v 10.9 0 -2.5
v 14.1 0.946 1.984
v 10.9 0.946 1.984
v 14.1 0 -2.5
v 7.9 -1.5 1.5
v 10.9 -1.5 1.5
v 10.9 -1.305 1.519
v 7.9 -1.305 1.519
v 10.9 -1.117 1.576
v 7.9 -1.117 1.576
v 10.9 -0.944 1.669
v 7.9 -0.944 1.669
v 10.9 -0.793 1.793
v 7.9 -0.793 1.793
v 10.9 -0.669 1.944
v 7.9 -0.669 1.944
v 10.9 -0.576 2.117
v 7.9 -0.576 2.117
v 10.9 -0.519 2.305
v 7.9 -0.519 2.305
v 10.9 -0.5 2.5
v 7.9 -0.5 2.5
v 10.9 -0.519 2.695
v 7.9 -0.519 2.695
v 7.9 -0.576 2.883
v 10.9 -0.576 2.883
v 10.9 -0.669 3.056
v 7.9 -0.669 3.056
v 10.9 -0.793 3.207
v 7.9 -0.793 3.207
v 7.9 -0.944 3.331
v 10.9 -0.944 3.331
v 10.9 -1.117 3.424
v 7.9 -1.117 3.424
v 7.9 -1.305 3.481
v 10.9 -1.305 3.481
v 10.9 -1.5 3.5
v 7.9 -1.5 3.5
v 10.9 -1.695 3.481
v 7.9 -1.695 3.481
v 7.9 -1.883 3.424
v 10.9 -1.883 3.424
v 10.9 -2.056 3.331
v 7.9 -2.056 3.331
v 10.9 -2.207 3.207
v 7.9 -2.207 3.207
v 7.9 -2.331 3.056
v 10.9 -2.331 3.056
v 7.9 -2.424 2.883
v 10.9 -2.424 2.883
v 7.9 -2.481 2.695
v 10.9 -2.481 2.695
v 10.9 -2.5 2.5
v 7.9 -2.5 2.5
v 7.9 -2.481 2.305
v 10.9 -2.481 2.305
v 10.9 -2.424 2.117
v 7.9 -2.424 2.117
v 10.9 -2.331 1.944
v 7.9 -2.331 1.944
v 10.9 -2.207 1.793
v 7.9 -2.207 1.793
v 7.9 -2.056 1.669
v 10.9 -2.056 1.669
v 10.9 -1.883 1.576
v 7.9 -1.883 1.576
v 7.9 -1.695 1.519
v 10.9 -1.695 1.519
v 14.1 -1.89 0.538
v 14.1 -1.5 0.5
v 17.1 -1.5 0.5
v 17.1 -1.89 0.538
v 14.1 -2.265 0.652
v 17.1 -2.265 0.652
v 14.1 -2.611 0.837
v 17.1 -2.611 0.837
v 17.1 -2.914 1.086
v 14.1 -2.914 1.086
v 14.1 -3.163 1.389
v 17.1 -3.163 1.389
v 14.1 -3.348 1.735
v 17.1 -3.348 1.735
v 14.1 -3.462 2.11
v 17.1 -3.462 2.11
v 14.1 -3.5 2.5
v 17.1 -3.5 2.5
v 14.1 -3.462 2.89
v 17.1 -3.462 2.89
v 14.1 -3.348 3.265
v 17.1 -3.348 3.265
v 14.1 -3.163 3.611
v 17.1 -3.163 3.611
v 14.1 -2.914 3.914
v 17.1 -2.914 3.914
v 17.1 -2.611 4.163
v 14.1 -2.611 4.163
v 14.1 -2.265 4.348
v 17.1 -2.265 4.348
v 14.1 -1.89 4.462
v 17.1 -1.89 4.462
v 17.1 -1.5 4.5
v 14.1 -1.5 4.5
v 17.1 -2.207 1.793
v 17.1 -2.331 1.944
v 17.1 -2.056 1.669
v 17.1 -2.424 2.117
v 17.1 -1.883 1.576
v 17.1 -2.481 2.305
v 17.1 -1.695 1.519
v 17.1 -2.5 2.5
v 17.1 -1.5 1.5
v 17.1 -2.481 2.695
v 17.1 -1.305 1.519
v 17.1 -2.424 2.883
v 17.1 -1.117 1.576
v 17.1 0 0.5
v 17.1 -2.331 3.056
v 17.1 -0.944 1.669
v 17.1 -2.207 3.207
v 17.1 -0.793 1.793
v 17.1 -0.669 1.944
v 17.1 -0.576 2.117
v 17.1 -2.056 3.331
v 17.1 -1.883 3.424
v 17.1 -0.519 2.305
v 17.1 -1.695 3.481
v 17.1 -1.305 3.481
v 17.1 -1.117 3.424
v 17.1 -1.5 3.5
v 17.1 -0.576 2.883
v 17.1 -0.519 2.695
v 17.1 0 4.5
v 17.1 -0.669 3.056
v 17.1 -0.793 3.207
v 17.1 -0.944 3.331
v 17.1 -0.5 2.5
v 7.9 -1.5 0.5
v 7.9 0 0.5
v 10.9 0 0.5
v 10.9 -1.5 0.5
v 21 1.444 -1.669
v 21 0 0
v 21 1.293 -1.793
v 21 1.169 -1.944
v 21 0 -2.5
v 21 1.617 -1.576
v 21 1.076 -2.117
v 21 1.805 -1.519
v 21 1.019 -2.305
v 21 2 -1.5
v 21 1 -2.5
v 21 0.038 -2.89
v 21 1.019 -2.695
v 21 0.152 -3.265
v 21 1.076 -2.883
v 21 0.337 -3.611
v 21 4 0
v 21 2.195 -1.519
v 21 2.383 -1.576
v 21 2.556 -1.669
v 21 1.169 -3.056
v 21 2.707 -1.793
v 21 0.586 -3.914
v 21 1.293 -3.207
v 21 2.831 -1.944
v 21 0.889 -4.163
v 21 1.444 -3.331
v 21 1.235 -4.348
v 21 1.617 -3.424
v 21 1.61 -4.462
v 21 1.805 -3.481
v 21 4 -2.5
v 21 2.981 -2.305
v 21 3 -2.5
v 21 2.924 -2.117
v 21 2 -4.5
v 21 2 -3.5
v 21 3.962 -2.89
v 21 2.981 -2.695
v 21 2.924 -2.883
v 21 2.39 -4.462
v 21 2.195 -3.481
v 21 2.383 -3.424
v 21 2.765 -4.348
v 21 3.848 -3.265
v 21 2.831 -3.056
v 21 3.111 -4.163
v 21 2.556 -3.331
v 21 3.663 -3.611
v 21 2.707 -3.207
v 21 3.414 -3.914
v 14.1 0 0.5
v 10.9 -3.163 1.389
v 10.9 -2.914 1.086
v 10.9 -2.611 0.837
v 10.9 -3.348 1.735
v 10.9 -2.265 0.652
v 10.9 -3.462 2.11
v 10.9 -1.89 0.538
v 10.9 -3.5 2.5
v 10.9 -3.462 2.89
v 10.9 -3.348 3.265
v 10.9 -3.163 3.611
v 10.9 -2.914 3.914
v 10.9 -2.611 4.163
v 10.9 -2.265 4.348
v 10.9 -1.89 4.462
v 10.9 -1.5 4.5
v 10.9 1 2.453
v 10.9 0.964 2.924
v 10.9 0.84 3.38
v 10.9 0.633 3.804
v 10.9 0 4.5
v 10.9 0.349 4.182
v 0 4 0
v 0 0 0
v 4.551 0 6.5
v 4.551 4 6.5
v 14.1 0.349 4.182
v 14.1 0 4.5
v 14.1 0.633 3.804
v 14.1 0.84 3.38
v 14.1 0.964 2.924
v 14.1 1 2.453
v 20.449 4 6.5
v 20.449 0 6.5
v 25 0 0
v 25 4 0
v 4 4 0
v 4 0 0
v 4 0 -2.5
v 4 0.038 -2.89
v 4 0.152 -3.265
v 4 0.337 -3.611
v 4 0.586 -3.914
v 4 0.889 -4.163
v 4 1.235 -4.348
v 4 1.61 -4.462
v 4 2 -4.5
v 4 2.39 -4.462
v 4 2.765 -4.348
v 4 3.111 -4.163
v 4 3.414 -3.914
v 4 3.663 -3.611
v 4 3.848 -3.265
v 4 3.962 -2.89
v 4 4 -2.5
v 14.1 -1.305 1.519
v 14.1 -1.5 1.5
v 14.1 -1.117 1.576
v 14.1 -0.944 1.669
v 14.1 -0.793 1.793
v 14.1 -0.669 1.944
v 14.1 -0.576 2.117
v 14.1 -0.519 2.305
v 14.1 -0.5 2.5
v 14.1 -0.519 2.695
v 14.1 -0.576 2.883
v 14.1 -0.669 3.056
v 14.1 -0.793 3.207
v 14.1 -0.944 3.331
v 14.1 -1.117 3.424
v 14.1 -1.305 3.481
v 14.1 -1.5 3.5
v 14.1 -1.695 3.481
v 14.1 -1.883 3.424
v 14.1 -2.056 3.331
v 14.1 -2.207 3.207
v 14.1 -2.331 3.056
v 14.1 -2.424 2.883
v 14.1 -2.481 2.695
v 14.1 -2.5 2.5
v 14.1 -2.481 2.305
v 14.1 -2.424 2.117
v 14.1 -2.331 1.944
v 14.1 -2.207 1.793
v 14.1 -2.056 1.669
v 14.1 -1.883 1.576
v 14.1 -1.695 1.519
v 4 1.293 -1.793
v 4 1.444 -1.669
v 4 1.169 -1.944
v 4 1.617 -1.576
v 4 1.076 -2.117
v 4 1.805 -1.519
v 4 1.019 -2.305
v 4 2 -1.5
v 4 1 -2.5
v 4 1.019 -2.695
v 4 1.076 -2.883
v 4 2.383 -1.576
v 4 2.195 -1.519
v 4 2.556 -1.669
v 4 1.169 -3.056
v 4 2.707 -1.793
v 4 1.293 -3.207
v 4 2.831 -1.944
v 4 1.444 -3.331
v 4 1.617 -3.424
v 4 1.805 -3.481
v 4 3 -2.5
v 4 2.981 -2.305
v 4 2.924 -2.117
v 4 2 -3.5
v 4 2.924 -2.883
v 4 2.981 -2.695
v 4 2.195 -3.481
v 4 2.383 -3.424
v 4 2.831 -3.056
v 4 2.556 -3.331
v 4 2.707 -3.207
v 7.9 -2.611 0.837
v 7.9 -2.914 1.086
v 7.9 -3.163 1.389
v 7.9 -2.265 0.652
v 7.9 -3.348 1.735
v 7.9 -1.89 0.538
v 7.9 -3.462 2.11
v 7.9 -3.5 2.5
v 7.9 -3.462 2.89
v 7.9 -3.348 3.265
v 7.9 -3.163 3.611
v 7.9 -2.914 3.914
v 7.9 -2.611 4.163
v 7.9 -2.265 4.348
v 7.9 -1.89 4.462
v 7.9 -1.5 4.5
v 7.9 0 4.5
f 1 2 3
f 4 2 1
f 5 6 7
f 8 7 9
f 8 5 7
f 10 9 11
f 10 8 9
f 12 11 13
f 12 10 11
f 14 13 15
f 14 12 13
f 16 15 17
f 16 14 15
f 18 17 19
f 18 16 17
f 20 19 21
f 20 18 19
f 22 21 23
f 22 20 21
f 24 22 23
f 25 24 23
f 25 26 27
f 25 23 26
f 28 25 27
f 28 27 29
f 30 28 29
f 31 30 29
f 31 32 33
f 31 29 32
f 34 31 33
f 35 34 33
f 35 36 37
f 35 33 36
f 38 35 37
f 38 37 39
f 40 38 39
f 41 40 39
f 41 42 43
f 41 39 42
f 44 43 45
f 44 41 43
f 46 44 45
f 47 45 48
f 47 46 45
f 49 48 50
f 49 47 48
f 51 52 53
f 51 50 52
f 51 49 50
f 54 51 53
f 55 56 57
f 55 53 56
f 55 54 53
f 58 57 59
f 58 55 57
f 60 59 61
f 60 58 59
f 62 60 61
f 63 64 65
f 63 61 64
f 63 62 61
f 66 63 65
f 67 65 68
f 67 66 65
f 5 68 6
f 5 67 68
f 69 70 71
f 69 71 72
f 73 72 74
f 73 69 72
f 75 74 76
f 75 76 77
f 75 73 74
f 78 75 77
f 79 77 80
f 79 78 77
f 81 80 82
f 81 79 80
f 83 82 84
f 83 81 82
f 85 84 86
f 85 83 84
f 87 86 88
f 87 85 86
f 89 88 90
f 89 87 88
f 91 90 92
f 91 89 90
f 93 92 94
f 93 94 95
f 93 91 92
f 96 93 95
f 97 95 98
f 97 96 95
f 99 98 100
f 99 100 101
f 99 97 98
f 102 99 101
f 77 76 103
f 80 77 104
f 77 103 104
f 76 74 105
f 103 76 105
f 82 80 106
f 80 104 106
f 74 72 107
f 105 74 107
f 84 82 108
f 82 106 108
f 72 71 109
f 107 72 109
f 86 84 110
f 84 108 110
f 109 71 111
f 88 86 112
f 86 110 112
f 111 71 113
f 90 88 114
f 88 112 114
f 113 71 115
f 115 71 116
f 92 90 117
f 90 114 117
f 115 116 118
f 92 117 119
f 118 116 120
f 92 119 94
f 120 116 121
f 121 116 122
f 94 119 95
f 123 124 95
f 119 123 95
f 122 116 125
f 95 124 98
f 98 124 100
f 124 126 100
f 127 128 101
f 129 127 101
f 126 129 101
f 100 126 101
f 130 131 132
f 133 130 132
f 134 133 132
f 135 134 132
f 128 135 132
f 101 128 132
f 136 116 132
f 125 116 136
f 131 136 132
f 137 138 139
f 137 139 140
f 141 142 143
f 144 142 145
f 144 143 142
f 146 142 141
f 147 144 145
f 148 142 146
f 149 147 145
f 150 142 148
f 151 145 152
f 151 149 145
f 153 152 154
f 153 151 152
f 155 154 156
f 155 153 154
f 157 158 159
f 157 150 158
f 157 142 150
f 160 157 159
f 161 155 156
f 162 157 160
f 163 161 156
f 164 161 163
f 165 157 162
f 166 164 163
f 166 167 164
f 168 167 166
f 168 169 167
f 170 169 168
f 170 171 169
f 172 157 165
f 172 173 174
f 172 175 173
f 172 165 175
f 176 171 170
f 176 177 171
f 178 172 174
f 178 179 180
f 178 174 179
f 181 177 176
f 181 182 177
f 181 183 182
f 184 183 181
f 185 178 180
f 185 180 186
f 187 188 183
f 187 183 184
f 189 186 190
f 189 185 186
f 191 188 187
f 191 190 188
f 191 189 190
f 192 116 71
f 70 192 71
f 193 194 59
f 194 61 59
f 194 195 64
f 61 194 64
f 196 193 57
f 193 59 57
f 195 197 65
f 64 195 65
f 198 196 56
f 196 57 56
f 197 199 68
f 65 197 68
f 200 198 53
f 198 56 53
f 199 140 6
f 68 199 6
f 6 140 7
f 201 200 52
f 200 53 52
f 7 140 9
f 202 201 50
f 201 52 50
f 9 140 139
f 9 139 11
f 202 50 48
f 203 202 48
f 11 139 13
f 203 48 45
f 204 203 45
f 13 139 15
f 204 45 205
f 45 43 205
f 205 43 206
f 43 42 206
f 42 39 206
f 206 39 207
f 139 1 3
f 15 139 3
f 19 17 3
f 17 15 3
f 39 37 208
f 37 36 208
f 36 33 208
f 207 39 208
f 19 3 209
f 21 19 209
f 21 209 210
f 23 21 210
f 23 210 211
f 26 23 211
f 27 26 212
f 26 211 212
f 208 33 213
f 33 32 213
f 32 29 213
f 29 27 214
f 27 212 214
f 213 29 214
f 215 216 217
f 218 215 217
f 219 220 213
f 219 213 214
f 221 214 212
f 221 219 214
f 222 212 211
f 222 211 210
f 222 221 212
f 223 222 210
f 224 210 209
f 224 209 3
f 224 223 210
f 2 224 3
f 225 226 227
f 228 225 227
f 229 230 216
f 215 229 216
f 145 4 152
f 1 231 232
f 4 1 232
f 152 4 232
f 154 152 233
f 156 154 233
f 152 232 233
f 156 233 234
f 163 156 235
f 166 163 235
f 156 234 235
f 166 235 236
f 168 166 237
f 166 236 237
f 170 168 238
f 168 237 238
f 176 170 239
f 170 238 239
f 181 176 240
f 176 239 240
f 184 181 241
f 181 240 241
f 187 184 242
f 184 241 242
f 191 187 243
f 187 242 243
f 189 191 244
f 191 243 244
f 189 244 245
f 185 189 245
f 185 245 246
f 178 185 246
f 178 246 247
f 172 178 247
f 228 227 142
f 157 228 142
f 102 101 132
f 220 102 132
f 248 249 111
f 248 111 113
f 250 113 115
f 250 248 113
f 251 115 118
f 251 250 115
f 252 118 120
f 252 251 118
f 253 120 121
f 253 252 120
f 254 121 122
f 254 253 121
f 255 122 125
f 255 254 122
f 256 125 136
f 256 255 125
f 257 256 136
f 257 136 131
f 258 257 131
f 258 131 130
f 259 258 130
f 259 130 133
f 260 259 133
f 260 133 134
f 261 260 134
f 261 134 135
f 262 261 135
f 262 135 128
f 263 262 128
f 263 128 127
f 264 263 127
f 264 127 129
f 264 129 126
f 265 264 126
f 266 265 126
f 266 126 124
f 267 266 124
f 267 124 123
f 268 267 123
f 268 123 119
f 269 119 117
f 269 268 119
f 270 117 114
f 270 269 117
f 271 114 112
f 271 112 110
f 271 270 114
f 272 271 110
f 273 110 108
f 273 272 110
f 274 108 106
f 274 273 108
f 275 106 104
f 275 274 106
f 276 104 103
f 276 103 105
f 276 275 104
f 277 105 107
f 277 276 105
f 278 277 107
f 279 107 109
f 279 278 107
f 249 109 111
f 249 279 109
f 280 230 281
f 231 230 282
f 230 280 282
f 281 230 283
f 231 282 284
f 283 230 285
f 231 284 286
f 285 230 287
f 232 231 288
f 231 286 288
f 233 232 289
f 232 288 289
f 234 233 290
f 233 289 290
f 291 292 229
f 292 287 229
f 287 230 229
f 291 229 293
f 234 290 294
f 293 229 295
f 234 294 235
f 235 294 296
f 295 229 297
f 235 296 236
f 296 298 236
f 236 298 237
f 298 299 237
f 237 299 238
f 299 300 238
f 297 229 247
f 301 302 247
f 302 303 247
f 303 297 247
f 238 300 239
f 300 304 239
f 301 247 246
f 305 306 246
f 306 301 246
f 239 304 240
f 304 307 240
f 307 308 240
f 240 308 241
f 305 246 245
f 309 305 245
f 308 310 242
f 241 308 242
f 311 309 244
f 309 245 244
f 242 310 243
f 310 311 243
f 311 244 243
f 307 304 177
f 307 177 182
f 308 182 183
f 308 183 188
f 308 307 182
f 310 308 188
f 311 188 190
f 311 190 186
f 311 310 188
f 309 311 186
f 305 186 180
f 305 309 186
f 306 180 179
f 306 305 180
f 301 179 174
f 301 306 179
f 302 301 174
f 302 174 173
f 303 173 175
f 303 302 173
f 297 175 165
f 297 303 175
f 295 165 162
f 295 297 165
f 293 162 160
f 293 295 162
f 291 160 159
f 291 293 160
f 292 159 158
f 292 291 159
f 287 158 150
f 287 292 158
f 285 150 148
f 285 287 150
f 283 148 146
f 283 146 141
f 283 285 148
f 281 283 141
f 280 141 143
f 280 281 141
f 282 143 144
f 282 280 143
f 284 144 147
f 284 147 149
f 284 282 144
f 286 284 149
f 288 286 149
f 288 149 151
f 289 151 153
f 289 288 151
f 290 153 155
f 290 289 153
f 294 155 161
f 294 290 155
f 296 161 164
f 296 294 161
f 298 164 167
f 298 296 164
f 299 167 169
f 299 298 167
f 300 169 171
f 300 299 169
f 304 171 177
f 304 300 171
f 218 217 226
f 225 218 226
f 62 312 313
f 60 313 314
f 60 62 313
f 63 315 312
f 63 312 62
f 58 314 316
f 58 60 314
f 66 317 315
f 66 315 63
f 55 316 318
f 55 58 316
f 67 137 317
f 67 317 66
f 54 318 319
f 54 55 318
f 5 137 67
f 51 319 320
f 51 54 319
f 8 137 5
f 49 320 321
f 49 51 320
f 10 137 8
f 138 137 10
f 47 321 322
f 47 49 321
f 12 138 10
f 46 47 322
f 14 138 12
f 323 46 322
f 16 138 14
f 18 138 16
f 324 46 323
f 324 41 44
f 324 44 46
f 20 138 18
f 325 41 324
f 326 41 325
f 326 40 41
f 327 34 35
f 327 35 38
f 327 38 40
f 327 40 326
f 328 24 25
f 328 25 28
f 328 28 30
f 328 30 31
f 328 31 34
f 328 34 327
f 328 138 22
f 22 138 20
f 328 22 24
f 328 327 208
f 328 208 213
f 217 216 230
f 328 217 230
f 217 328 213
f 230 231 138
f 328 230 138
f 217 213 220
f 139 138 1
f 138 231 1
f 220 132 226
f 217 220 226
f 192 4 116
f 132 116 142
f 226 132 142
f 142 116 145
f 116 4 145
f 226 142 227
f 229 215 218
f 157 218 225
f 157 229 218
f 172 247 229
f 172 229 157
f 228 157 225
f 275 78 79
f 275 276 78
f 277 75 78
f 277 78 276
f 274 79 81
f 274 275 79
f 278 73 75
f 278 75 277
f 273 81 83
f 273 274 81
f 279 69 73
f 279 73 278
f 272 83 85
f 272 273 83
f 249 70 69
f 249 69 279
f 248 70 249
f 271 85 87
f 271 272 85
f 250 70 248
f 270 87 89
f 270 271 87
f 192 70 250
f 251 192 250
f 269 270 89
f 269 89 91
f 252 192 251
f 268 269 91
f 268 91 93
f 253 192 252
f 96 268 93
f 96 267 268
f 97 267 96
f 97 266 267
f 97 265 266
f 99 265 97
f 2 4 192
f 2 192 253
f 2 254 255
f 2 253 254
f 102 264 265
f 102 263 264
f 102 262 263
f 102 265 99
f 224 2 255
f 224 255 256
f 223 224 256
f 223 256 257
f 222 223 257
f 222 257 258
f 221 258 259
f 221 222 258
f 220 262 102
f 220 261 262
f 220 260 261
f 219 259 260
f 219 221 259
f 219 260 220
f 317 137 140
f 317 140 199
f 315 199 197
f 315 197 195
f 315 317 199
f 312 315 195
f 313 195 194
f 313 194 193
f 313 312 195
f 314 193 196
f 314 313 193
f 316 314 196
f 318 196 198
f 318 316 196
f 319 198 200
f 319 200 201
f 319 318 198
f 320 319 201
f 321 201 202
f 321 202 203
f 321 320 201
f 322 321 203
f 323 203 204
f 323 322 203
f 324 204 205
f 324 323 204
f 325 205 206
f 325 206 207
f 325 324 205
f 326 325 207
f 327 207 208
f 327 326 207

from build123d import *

# Parameters (mm, degrees)
BOSS_EXTRUDE1_DEPTH      = 4
BOSS_EXTRUDE2_START      = 4
SKETCH2_R                = 1
BOSS_EXTRUDE2_DEPTH      = 17
BOSS_EXTRUDE3_DEPTH      = 4.6
BOSS_EXTRUDE3_DEPTH_BACK = 4.6
BOSS_EXTRUDE3_START      = 12.5
SKETCH3_R                = 1
CUT_EXTRUDE1_REACH       = 29.604
SKETCH4_W                = 3.2
SKETCH4_H                = 3.5
CUT_EXTRUDE2_DEPTH       = 3.2


with BuildPart() as part:
    # Sketch1 → Boss-Extrude1 (new body)
    with BuildSketch(Plane(origin=(0, 0, 0), x_dir=(1, 0, 0), z_dir=(0, 1, 0))):
        Polygon((0, 0), (4.551348998, -6.5), (20.448651002, -6.5), (25, 0), align=None)
    extrude(amount=BOSS_EXTRUDE1_DEPTH)

    # Sketch2 → Boss-Extrude2 (add)
    with BuildSketch(Plane(origin=(0, 0, 0), x_dir=(0, 0, -1), z_dir=(1, 0, 0)).offset(BOSS_EXTRUDE2_START)):
        with BuildLine():
            Line((0, 0), (2.5, 0))
            ThreePointArc((2.5, 0), (4.5, 2), (2.5, 4))
            Line((2.5, 4), (0, 4))
            Line((0, 4), (0, 0))
        make_face()
        with Locations((2.5, 2)):
            Circle(SKETCH2_R, mode=Mode.SUBTRACT)
    extrude(amount=BOSS_EXTRUDE2_DEPTH)

    # Sketch3 → Boss-Extrude3 (add, two sides: drawn at the far end of the back side and taken through both)
    with BuildSketch(Plane(origin=(0, 0, 0), x_dir=(0, 0, -1), z_dir=(1, 0, 0)).offset(BOSS_EXTRUDE3_START - BOSS_EXTRUDE3_DEPTH_BACK)):
        with BuildLine():
            Line((-4.5, 0), (-0.5, 0))
            Line((-0.5, 0), (-0.5, -1.5))
            ThreePointArc((-0.5, -1.5), (-2.5, -3.5), (-4.5, -1.5))
            Line((-4.5, -1.5), (-4.5, 0))
        make_face()
        with Locations((-2.5, -1.5)):
            Circle(SKETCH3_R, mode=Mode.SUBTRACT)
    extrude(amount=BOSS_EXTRUDE3_DEPTH + BOSS_EXTRUDE3_DEPTH_BACK)

    # Sketch4 → Cut-Extrude1 (cut, up to next)
    with BuildSketch(Plane.XY.offset(6.5), mode=Mode.PRIVATE) as cut_extrude1_sk1:
        with Locations((12.5, -1.75)):
            Rectangle(SKETCH4_W, SKETCH4_H)
    cut_extrude1_tool1 = extrude(cut_extrude1_sk1.sketch, amount=-CUT_EXTRUDE1_REACH, mode=Mode.PRIVATE) & part.part
    add(cut_extrude1_tool1.solids().sort_by_distance((12.5, -1.75, 6.5))[0], mode=Mode.SUBTRACT)

    # Sketch5 → Cut-Extrude2 (cut)
    with BuildSketch(Plane.ZY.offset(-14.1)):
        with BuildLine():
            Line((1.983840692, 0.94613564), (-2.5, 0))
            Line((-2.5, 0), (0.5, 0))
            ThreePointArc((0.5, 0), (3.84408243, -3.607947443), (1.983840692, 0.94613564))
        make_face()
    extrude(amount=CUT_EXTRUDE2_DEPTH, mode=Mode.SUBTRACT)


solid = part.part
